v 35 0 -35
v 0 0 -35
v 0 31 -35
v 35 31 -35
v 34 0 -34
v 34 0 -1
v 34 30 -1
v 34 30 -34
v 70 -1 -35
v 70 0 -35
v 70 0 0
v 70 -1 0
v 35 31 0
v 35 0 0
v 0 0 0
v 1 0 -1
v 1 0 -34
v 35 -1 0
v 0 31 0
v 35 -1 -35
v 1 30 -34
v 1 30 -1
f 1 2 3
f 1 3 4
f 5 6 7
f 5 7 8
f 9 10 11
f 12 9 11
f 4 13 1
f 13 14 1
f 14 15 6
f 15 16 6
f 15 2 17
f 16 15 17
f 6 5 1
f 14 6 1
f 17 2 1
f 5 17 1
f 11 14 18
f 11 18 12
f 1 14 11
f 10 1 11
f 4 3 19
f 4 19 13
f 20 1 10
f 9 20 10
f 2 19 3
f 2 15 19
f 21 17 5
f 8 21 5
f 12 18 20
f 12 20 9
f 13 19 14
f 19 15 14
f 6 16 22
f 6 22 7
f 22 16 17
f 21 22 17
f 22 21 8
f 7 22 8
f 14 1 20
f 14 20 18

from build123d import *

# Parameters (mm, degrees)
SKETCH1_W           = 35
SKETCH1_H           = 35
SKETCH1_W_2         = 33
SKETCH1_H_2         = 33
BOSS_EXTRUDE1_DEPTH = 30
SKETCH2_W           = 35
SKETCH2_H           = 35
BOSS_EXTRUDE2_DEPTH = 1
SKETCH3_W           = 35
SKETCH3_H           = 35
BOSS_EXTRUDE3_DEPTH = 1


with BuildPart() as part:
    # Sketch1 → Boss-Extrude1 (new body)
    with BuildSketch(Plane(origin=(0, 0, 0), x_dir=(1, 0, 0), z_dir=(0, 1, 0))):
        with Locations((17.5, 17.5)):
            Rectangle(SKETCH1_W, SKETCH1_H)
        with Locations((17.5, 17.5)):
            Rectangle(SKETCH1_W_2, SKETCH1_H_2, mode=Mode.SUBTRACT)
    extrude(amount=BOSS_EXTRUDE1_DEPTH)

    # Sketch2 → Boss-Extrude2 (add)
    with BuildSketch(Plane(origin=(0, 30, 0), x_dir=(1, 0, 0), z_dir=(0, 1, 0))):
        with Locations((17.5, 17.5)):
            Rectangle(SKETCH2_W, SKETCH2_H)
    extrude(amount=BOSS_EXTRUDE2_DEPTH)


with BuildPart() as body_2:
    # Sketch3 → Boss-Extrude3 (new body)
    with BuildSketch(Plane.XZ):
        with Locations((52.5, -17.5)):
            Rectangle(SKETCH3_W, SKETCH3_H)
    extrude(amount=BOSS_EXTRUDE3_DEPTH)


solid = Compound([part.part, body_2.part])
